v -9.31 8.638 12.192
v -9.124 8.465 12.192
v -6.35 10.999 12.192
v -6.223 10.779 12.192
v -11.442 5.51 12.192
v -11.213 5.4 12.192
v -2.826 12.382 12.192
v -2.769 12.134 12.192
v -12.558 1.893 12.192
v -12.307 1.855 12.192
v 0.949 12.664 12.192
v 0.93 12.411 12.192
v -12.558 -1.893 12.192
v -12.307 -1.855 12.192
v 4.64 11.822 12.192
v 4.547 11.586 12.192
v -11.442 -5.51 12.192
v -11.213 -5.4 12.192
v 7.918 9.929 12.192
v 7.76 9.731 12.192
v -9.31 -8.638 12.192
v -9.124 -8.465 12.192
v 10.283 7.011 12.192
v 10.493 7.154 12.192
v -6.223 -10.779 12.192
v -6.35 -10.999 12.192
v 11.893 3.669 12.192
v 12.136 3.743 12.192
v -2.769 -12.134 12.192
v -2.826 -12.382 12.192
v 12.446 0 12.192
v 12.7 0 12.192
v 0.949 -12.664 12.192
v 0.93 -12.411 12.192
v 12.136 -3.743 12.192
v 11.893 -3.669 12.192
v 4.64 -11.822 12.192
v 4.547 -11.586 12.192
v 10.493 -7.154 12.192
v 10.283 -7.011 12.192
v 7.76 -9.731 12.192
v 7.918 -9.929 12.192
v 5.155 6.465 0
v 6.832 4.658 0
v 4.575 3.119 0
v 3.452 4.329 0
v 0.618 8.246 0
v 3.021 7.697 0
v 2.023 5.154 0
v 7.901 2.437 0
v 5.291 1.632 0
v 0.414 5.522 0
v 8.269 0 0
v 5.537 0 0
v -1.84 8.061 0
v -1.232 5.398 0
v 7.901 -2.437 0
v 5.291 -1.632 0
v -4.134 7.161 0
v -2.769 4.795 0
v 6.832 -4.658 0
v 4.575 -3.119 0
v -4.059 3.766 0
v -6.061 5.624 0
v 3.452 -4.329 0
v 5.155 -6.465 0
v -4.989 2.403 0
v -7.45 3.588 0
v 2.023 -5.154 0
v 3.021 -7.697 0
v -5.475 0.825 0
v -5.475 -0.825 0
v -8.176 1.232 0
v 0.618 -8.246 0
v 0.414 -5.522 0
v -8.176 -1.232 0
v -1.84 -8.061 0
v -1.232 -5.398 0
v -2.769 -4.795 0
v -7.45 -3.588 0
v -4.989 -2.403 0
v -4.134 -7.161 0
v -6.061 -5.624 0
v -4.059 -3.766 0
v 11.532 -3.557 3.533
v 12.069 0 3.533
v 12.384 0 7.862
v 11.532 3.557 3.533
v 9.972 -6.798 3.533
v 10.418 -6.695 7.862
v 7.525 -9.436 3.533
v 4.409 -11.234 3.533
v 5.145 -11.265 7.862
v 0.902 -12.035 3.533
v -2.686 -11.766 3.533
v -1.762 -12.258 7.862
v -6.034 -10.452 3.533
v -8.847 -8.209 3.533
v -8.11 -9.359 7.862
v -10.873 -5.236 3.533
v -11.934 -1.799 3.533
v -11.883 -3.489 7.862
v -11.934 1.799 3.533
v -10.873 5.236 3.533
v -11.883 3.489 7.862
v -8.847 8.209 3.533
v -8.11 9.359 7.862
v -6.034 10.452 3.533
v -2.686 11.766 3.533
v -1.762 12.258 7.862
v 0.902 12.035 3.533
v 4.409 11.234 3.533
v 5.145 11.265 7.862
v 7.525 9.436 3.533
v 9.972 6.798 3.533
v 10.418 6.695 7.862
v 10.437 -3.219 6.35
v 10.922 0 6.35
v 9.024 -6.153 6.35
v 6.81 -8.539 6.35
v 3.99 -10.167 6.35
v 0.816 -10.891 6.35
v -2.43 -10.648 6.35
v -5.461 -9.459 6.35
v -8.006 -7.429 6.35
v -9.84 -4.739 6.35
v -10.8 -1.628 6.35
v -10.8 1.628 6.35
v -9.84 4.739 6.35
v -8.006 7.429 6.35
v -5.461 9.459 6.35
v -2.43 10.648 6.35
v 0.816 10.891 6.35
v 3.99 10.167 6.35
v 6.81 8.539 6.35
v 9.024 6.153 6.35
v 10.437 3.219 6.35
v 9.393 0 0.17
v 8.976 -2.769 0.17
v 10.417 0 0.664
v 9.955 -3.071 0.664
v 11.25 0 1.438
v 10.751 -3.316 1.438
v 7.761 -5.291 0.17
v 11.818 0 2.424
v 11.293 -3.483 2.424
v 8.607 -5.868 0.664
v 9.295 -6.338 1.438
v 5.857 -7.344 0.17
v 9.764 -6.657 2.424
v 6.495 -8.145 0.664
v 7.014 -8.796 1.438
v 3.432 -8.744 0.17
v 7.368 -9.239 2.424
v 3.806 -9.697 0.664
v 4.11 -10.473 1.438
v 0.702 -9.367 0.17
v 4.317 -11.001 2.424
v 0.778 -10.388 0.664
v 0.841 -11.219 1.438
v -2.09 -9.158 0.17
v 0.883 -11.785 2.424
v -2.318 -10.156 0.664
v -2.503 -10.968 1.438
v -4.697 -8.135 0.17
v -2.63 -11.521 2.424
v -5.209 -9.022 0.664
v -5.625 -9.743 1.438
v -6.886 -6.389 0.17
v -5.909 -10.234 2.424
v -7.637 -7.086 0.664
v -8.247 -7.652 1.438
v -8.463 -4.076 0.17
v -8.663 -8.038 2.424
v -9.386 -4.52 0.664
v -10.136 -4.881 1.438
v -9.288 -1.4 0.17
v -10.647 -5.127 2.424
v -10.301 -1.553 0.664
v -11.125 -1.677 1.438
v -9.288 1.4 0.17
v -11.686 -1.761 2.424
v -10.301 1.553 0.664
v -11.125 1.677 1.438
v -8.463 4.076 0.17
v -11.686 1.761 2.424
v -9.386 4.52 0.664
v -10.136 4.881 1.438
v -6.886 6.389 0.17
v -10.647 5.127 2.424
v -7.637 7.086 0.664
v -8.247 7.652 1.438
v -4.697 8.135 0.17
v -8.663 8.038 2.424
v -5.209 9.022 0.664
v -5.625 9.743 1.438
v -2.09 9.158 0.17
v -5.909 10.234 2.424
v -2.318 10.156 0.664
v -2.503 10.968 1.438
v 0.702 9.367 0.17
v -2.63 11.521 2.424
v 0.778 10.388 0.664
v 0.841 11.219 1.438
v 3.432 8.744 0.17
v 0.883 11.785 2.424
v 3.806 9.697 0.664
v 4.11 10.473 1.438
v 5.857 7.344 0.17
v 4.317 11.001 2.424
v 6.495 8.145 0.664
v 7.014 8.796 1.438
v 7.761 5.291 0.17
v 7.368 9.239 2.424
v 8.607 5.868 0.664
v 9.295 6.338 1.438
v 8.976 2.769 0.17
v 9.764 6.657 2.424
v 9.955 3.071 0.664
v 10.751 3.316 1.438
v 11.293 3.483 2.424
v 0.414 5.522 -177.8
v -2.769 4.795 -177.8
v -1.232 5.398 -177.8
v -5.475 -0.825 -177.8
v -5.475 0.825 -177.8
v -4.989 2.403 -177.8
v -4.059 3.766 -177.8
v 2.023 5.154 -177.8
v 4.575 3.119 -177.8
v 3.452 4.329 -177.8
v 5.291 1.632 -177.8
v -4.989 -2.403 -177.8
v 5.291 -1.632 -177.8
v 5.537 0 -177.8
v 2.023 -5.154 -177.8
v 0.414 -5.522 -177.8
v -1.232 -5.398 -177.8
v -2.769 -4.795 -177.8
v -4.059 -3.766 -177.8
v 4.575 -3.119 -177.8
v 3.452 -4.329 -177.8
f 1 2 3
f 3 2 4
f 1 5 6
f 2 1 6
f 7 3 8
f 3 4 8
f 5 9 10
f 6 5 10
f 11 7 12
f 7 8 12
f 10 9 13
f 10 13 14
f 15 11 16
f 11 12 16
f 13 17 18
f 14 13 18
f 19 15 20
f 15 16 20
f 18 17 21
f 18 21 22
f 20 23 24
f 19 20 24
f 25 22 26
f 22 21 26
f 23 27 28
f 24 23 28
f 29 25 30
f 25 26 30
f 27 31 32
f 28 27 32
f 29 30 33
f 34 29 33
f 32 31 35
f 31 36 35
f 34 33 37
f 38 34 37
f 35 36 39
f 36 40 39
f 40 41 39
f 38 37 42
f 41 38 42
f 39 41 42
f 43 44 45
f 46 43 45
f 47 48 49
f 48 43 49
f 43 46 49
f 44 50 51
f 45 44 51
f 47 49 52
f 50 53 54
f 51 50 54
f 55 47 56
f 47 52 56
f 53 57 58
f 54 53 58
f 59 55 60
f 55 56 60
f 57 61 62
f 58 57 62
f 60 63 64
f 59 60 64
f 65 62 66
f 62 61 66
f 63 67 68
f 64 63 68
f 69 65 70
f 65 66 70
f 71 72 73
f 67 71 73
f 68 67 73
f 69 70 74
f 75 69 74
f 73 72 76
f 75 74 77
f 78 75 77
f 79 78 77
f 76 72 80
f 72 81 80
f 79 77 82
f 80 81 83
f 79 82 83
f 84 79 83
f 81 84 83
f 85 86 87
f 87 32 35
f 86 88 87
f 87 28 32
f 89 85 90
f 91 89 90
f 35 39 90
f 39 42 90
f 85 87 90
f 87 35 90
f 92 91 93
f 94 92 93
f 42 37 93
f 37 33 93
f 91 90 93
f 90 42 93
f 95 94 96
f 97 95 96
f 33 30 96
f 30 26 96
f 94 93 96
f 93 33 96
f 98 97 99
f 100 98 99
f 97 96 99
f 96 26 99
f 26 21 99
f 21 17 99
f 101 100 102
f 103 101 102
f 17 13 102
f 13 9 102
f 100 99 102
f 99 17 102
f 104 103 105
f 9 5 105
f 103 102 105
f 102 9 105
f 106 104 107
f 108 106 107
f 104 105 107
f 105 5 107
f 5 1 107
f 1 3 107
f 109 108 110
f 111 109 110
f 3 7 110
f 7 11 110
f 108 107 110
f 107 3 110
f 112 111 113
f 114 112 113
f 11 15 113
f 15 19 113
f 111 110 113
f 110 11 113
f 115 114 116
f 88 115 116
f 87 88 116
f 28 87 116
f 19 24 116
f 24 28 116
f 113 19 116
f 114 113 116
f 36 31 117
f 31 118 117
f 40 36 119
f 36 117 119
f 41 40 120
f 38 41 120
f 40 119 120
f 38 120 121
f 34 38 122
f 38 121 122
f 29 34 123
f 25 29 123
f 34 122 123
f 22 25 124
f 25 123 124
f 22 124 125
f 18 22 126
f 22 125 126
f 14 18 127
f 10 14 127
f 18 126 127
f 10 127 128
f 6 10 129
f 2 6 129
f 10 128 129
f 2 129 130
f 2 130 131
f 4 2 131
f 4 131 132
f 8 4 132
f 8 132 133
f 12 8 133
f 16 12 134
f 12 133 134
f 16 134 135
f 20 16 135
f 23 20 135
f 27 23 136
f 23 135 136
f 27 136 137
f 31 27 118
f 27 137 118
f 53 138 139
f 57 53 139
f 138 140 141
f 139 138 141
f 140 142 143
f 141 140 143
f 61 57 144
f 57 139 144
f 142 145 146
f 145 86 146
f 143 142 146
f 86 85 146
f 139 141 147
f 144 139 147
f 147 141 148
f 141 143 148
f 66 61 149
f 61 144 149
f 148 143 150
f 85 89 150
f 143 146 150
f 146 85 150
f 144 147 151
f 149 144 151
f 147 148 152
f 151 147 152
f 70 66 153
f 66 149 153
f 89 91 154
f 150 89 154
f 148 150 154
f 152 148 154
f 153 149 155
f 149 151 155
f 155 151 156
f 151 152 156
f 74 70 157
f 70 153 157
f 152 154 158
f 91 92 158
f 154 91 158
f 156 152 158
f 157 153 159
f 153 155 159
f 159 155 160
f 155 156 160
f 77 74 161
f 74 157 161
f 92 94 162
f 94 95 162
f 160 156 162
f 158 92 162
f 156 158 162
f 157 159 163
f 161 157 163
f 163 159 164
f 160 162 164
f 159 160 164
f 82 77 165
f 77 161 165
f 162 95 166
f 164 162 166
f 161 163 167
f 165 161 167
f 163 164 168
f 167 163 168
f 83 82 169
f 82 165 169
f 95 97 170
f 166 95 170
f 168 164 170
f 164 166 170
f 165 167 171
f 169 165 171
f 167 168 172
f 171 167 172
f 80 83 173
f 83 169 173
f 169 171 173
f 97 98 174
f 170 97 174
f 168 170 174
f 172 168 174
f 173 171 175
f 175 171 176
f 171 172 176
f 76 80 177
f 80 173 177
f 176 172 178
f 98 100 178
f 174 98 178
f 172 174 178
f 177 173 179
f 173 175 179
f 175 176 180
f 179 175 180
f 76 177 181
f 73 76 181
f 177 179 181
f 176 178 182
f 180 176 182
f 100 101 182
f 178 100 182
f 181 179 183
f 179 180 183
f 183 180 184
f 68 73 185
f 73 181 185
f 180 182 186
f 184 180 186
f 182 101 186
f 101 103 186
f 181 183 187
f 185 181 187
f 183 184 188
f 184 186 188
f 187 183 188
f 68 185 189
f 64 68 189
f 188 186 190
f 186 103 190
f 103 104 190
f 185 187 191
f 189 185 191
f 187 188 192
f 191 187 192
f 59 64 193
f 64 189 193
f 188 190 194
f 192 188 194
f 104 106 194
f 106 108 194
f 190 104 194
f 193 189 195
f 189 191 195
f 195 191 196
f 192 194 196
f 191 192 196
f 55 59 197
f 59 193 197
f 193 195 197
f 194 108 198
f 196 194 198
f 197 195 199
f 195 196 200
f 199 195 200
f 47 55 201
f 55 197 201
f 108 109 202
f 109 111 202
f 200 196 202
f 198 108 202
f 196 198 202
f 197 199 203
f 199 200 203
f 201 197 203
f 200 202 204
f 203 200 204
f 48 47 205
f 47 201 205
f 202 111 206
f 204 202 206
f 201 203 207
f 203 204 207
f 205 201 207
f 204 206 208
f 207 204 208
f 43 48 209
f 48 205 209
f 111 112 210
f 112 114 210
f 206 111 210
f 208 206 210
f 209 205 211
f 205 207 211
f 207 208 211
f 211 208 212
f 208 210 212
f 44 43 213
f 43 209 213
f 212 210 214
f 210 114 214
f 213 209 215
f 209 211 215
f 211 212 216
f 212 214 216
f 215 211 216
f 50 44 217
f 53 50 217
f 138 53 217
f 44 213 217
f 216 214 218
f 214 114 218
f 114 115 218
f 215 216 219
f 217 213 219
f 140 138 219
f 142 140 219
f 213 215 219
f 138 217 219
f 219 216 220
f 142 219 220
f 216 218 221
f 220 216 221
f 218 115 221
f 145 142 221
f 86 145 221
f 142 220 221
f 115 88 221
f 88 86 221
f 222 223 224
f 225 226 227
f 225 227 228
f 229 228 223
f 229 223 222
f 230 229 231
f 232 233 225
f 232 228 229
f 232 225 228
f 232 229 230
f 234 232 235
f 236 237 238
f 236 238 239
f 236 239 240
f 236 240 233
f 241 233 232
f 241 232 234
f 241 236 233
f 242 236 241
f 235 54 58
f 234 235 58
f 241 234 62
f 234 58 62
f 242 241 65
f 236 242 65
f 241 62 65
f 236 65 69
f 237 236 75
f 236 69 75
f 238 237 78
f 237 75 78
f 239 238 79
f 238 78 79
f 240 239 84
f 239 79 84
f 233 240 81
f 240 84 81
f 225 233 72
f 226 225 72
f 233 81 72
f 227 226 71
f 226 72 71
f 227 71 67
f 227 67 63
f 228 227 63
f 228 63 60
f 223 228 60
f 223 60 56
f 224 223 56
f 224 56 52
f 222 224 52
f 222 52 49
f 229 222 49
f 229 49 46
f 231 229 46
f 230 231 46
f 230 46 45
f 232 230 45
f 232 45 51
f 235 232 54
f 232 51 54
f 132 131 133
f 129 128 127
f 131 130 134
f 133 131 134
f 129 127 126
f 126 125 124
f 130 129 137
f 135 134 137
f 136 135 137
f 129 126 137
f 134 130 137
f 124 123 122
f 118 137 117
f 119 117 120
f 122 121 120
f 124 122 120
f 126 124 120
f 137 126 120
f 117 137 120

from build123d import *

# Parameters (mm, degrees)
F2_R     = 3.81
F3_R     = 5.5372
F4_DEPTH = 177.8


with BuildPart() as f1:
    # F0 (on Front) → F1 (revolve)
    with BuildSketch(Plane.XZ):
        Polygon((0, 6.35), (0, 0), (11.811, 0), (12.7, 12.192), (12.446, 12.192), (10.922, 6.35), align=None)
    revolve(axis=Axis((0, 0, 3.175), (0, 0, -1)))

    # F2
    f2_edges = [f1.edges().sort_by_distance(p)[0] for p in [
        (-11.811, 0, 0),
    ]]
    fillet(f2_edges, radius=F2_R)

    # F3 (on face) → F4 (join)
    with BuildSketch(Plane(origin=(0, 0, 0), x_dir=(1, 0, 0), z_dir=(0, 0, -1))):
        Circle(F3_R)
    extrude(amount=F4_DEPTH)


solid = f1.part
